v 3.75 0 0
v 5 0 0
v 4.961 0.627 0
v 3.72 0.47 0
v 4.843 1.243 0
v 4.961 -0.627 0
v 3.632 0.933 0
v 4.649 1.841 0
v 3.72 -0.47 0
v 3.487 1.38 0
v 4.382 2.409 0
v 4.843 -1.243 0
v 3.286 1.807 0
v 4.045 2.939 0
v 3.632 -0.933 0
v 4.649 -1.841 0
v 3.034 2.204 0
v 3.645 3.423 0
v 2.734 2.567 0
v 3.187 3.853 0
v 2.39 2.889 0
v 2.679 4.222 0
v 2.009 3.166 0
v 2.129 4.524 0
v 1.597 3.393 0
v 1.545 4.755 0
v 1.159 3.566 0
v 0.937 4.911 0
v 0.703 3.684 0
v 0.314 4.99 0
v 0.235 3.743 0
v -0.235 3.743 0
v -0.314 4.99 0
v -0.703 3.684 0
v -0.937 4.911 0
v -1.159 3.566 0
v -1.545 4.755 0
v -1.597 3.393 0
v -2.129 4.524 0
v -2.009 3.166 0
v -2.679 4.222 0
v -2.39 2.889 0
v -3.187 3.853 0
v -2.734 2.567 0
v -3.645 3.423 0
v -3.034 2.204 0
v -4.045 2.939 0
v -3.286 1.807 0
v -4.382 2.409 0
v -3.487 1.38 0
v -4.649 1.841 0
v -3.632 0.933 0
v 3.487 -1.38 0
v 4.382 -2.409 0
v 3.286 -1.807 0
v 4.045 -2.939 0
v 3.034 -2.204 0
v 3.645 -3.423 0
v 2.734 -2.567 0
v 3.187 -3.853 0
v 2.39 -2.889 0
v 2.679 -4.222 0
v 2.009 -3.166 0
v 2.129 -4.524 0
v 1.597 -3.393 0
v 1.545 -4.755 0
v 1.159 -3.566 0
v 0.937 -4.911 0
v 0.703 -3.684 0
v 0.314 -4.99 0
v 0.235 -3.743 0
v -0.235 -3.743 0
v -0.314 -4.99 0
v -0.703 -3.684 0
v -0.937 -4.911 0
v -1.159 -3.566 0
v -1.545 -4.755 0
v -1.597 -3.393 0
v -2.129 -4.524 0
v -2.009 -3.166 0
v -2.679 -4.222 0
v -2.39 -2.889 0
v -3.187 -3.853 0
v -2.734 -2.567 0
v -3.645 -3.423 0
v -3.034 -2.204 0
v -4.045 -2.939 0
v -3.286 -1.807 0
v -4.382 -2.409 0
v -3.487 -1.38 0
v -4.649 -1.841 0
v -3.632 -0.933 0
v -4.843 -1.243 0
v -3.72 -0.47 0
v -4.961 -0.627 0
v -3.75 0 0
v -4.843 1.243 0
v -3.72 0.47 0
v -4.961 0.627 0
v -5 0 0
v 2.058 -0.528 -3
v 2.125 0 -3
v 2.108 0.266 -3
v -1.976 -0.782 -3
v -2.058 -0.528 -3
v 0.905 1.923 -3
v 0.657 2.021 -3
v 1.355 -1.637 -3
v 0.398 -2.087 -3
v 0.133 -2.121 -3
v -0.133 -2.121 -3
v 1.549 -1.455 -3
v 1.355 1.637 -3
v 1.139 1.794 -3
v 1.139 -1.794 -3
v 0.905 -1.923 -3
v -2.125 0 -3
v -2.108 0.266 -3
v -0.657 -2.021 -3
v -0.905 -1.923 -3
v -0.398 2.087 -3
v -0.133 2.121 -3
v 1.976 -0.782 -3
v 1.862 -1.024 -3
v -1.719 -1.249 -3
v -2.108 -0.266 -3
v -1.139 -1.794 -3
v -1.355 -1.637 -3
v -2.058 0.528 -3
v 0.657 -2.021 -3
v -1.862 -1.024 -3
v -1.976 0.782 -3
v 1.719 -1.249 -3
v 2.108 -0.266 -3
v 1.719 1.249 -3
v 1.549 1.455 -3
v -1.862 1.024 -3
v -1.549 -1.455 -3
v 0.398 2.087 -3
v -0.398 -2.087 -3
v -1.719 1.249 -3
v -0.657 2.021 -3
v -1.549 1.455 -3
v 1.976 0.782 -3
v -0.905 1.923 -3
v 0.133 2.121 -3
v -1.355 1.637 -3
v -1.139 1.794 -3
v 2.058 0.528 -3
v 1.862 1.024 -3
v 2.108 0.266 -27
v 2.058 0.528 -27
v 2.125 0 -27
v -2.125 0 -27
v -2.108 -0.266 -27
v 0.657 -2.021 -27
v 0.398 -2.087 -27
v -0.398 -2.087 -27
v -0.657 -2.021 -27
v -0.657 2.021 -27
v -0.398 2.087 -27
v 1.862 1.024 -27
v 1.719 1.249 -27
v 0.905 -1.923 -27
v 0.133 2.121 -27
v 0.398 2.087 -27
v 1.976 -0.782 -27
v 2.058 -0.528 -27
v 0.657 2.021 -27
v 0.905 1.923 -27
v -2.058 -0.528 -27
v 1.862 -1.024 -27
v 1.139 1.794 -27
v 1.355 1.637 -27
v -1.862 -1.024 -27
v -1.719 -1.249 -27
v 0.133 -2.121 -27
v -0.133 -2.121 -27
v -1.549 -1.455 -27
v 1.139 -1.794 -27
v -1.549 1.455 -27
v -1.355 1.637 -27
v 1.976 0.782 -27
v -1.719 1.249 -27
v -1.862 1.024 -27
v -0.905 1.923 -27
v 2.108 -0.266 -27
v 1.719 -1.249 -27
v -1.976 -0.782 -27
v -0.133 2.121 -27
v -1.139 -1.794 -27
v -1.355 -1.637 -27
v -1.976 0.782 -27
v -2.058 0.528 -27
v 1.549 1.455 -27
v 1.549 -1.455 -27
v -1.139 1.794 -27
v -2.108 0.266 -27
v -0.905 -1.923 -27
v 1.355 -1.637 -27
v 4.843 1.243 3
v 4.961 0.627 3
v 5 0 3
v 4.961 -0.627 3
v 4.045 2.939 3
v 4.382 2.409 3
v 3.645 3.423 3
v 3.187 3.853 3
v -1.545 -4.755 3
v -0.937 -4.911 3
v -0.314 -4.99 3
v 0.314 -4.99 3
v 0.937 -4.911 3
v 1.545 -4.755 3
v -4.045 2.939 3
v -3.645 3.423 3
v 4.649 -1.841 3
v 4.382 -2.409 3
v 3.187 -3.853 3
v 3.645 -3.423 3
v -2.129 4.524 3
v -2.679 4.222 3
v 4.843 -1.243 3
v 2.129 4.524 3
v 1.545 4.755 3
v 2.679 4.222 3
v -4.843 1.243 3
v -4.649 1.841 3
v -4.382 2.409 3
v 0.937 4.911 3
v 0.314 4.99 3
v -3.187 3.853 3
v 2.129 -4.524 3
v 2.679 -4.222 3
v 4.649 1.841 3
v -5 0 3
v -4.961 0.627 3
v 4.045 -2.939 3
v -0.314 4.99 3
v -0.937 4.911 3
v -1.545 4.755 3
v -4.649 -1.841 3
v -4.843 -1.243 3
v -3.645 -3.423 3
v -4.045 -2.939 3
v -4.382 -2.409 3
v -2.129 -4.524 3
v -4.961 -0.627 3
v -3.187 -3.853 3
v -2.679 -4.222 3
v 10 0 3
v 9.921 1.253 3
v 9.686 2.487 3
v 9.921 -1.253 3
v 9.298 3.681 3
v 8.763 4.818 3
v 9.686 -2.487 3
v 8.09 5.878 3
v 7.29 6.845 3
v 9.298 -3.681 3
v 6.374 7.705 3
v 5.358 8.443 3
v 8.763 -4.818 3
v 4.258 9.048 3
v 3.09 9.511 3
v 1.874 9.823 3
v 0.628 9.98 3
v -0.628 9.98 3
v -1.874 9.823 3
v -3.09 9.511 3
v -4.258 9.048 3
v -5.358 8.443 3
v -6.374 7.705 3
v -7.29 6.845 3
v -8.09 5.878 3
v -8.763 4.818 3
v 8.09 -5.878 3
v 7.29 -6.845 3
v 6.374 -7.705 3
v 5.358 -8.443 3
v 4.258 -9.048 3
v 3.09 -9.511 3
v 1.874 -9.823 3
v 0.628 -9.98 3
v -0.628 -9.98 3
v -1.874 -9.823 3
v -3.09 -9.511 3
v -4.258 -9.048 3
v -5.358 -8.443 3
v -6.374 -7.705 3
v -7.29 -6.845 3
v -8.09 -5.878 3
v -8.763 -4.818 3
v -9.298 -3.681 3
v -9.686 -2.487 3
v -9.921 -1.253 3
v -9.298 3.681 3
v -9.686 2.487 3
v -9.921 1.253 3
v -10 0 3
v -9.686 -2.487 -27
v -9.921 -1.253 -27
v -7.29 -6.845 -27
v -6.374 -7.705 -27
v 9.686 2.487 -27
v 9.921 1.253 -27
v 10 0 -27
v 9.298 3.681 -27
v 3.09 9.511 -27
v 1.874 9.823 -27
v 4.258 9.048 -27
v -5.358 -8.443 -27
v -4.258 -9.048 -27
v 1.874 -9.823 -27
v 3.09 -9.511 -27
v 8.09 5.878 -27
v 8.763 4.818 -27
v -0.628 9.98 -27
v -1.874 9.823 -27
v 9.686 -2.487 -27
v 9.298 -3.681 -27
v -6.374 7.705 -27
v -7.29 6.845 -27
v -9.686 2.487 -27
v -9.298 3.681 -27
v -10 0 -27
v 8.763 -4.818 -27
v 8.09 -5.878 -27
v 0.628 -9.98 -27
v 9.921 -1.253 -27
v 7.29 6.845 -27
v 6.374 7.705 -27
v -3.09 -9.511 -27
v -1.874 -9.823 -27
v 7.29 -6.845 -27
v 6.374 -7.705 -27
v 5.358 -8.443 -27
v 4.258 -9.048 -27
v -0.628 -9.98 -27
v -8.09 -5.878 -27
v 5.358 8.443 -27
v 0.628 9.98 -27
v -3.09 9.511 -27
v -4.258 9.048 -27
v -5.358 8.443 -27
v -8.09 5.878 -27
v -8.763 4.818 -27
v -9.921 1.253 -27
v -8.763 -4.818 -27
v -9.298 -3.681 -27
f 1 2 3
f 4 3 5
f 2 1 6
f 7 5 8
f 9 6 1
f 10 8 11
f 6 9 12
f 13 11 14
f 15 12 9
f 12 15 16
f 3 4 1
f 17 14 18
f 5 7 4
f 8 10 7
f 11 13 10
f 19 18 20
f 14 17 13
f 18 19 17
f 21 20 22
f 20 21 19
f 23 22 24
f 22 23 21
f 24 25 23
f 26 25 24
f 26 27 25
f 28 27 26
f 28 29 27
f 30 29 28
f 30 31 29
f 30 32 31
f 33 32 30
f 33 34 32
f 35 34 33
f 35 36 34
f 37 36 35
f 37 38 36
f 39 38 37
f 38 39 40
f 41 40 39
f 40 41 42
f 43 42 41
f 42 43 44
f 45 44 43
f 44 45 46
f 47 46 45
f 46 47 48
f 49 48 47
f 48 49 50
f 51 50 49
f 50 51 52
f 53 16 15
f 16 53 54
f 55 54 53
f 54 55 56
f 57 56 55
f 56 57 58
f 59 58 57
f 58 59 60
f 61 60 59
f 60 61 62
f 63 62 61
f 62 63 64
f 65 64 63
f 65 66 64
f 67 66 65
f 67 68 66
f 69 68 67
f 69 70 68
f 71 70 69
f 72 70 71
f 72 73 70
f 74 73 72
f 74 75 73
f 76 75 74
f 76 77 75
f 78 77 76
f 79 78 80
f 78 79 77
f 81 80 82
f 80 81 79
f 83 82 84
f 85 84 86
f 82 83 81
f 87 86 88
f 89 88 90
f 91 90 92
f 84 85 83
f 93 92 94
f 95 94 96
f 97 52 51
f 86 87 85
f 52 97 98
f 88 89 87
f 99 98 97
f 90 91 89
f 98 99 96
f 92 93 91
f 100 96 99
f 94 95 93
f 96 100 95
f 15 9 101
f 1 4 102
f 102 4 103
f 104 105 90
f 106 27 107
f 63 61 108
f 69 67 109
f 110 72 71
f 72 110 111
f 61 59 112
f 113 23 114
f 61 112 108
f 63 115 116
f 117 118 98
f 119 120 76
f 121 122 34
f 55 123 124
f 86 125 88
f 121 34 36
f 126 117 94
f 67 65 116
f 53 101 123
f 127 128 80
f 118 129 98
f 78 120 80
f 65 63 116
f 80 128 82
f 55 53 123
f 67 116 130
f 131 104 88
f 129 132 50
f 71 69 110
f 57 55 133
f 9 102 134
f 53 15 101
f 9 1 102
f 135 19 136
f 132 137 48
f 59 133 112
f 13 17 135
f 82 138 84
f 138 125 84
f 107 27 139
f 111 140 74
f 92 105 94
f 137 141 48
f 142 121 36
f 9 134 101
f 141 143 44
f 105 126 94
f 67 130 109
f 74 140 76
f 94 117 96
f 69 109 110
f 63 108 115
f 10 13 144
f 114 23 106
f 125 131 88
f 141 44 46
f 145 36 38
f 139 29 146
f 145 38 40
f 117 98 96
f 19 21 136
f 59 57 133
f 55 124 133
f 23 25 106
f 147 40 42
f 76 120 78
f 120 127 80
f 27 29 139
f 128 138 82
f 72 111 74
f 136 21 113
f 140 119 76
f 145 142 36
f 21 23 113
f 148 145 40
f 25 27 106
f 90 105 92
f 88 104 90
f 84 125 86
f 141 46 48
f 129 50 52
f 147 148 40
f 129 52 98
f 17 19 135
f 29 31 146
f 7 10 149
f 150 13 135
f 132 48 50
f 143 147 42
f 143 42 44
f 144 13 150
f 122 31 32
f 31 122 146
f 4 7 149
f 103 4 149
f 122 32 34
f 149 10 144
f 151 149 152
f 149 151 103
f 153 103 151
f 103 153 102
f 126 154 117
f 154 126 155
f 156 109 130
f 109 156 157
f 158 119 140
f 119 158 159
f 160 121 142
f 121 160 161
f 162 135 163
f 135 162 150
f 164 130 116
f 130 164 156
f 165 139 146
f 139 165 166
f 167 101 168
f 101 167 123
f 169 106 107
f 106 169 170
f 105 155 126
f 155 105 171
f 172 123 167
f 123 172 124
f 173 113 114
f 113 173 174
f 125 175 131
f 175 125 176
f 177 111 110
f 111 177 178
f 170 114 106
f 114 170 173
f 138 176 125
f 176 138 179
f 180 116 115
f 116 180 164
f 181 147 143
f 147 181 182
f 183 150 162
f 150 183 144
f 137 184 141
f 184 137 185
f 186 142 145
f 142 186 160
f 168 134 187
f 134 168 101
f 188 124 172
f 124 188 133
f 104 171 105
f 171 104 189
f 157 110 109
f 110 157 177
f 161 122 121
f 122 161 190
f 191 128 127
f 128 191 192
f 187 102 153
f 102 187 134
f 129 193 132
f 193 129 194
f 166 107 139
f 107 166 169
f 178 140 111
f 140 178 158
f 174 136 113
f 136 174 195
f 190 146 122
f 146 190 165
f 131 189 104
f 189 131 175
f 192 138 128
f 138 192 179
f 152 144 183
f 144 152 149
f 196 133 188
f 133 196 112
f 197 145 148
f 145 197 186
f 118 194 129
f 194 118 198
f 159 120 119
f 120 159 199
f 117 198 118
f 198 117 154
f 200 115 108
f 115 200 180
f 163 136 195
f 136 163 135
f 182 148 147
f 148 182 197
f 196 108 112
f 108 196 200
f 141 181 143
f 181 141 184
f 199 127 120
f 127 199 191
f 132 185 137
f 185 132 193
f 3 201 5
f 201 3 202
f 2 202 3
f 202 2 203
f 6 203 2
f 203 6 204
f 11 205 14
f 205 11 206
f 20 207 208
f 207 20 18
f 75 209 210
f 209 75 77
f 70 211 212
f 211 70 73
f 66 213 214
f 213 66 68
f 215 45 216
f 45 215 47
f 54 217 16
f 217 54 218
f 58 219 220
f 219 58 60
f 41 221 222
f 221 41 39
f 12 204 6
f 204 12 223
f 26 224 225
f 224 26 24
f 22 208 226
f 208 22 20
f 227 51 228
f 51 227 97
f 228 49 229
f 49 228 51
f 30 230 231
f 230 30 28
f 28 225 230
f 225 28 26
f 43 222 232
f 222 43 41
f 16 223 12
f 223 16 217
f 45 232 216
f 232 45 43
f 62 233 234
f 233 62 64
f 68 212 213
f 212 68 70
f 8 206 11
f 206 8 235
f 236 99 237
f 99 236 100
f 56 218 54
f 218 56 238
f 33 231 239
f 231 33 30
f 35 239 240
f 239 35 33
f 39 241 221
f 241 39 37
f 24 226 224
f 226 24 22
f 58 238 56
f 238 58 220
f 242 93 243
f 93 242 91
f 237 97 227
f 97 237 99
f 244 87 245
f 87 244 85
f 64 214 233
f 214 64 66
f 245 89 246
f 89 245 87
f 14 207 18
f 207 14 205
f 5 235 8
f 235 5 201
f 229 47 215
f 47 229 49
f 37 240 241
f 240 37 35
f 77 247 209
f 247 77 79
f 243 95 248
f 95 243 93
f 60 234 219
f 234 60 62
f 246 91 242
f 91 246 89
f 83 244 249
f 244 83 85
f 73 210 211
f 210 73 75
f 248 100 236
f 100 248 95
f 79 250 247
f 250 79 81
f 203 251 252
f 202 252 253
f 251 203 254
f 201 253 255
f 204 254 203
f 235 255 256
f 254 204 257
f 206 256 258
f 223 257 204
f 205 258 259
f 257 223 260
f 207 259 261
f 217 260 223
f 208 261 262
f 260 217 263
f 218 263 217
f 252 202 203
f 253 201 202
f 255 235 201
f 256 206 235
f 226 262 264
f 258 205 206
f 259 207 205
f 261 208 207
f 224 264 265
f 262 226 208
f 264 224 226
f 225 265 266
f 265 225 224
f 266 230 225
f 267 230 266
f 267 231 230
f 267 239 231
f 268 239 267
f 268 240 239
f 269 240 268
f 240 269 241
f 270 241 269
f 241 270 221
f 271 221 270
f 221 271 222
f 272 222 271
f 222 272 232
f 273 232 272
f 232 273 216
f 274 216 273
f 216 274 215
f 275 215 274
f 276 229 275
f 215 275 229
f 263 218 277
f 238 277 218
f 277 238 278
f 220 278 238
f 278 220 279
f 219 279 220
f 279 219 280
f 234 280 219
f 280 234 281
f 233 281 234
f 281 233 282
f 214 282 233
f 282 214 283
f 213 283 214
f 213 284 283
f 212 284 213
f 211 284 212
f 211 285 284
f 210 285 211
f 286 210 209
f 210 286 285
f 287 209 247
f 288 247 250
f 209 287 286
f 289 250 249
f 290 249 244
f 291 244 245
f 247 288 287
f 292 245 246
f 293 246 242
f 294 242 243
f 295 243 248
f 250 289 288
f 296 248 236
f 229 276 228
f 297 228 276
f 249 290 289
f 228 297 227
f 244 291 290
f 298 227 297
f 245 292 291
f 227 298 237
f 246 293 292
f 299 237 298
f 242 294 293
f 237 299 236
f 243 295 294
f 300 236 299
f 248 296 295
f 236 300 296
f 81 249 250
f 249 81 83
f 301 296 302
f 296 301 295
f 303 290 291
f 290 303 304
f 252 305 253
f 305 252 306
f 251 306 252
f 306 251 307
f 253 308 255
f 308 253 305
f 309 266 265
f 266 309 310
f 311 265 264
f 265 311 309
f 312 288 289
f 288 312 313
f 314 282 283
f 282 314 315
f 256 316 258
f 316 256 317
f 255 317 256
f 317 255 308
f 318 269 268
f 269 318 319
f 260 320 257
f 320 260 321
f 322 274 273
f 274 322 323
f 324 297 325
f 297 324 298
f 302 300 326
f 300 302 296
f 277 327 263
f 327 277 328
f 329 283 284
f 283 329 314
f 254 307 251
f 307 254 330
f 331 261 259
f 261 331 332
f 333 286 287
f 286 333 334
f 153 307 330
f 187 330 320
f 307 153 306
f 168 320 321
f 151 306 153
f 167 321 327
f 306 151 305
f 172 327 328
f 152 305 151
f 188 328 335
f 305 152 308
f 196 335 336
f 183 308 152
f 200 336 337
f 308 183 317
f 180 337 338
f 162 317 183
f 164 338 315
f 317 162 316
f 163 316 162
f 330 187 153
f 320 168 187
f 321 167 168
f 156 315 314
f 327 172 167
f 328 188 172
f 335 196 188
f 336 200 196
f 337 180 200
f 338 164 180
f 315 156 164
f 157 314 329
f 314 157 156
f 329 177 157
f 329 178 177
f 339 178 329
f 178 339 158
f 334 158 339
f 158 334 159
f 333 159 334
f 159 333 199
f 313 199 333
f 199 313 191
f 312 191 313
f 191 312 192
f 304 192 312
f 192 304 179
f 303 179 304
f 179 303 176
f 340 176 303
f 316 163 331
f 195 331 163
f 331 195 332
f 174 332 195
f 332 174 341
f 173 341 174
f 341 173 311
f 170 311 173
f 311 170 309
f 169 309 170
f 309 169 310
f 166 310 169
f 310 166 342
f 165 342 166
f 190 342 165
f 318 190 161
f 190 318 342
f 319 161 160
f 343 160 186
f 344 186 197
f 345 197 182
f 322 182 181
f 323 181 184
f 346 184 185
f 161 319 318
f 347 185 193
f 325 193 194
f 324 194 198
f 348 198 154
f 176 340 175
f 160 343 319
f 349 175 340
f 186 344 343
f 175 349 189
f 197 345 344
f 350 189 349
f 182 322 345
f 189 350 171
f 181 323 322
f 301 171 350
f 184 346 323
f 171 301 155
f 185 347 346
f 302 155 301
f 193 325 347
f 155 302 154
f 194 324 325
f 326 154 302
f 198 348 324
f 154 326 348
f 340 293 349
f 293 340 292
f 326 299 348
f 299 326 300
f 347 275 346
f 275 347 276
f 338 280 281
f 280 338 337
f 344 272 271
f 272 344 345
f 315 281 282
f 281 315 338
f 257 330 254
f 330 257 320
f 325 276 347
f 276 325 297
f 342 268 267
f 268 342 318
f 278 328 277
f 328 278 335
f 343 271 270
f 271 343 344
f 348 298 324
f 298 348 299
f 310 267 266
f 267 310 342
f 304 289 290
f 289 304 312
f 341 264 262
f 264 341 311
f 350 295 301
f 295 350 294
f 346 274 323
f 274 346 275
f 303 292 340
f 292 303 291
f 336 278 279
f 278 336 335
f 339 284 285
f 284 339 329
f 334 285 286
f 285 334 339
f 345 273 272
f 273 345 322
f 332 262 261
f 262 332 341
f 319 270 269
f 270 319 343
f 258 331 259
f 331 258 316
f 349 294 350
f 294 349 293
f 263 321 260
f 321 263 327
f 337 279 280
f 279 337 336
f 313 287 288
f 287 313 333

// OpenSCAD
$fn = 50;

difference() {
	union() {
		translate(v = [0, 0, -27.0]) {
			cylinder(h = 30, r = 10.0);
		}
	}
	union() {
		translate(v = [0, 0, 0]) {
			rotate(a = [0, 0, 0]) {
				difference() {
					union() {
						translate(v = [0, 0, -30.0]) {
							cylinder(h = 30, r = 2.0);
						}
						translate(v = [0, 0, -3]) {
							cylinder(h = 3, r1 = 2.125, r2 = 3.75);
						}
						translate(v = [0, 0, -30.0]) {
							cylinder(h = 30, r = 2.125);
						}
						translate(v = [0, 0, -30.0]) {
							cylinder(h = 30, r = 2.0);
						}
					}
					union();
				}
			}
		}
		#cylinder(h = 3, r = 5.0);
	}
}
